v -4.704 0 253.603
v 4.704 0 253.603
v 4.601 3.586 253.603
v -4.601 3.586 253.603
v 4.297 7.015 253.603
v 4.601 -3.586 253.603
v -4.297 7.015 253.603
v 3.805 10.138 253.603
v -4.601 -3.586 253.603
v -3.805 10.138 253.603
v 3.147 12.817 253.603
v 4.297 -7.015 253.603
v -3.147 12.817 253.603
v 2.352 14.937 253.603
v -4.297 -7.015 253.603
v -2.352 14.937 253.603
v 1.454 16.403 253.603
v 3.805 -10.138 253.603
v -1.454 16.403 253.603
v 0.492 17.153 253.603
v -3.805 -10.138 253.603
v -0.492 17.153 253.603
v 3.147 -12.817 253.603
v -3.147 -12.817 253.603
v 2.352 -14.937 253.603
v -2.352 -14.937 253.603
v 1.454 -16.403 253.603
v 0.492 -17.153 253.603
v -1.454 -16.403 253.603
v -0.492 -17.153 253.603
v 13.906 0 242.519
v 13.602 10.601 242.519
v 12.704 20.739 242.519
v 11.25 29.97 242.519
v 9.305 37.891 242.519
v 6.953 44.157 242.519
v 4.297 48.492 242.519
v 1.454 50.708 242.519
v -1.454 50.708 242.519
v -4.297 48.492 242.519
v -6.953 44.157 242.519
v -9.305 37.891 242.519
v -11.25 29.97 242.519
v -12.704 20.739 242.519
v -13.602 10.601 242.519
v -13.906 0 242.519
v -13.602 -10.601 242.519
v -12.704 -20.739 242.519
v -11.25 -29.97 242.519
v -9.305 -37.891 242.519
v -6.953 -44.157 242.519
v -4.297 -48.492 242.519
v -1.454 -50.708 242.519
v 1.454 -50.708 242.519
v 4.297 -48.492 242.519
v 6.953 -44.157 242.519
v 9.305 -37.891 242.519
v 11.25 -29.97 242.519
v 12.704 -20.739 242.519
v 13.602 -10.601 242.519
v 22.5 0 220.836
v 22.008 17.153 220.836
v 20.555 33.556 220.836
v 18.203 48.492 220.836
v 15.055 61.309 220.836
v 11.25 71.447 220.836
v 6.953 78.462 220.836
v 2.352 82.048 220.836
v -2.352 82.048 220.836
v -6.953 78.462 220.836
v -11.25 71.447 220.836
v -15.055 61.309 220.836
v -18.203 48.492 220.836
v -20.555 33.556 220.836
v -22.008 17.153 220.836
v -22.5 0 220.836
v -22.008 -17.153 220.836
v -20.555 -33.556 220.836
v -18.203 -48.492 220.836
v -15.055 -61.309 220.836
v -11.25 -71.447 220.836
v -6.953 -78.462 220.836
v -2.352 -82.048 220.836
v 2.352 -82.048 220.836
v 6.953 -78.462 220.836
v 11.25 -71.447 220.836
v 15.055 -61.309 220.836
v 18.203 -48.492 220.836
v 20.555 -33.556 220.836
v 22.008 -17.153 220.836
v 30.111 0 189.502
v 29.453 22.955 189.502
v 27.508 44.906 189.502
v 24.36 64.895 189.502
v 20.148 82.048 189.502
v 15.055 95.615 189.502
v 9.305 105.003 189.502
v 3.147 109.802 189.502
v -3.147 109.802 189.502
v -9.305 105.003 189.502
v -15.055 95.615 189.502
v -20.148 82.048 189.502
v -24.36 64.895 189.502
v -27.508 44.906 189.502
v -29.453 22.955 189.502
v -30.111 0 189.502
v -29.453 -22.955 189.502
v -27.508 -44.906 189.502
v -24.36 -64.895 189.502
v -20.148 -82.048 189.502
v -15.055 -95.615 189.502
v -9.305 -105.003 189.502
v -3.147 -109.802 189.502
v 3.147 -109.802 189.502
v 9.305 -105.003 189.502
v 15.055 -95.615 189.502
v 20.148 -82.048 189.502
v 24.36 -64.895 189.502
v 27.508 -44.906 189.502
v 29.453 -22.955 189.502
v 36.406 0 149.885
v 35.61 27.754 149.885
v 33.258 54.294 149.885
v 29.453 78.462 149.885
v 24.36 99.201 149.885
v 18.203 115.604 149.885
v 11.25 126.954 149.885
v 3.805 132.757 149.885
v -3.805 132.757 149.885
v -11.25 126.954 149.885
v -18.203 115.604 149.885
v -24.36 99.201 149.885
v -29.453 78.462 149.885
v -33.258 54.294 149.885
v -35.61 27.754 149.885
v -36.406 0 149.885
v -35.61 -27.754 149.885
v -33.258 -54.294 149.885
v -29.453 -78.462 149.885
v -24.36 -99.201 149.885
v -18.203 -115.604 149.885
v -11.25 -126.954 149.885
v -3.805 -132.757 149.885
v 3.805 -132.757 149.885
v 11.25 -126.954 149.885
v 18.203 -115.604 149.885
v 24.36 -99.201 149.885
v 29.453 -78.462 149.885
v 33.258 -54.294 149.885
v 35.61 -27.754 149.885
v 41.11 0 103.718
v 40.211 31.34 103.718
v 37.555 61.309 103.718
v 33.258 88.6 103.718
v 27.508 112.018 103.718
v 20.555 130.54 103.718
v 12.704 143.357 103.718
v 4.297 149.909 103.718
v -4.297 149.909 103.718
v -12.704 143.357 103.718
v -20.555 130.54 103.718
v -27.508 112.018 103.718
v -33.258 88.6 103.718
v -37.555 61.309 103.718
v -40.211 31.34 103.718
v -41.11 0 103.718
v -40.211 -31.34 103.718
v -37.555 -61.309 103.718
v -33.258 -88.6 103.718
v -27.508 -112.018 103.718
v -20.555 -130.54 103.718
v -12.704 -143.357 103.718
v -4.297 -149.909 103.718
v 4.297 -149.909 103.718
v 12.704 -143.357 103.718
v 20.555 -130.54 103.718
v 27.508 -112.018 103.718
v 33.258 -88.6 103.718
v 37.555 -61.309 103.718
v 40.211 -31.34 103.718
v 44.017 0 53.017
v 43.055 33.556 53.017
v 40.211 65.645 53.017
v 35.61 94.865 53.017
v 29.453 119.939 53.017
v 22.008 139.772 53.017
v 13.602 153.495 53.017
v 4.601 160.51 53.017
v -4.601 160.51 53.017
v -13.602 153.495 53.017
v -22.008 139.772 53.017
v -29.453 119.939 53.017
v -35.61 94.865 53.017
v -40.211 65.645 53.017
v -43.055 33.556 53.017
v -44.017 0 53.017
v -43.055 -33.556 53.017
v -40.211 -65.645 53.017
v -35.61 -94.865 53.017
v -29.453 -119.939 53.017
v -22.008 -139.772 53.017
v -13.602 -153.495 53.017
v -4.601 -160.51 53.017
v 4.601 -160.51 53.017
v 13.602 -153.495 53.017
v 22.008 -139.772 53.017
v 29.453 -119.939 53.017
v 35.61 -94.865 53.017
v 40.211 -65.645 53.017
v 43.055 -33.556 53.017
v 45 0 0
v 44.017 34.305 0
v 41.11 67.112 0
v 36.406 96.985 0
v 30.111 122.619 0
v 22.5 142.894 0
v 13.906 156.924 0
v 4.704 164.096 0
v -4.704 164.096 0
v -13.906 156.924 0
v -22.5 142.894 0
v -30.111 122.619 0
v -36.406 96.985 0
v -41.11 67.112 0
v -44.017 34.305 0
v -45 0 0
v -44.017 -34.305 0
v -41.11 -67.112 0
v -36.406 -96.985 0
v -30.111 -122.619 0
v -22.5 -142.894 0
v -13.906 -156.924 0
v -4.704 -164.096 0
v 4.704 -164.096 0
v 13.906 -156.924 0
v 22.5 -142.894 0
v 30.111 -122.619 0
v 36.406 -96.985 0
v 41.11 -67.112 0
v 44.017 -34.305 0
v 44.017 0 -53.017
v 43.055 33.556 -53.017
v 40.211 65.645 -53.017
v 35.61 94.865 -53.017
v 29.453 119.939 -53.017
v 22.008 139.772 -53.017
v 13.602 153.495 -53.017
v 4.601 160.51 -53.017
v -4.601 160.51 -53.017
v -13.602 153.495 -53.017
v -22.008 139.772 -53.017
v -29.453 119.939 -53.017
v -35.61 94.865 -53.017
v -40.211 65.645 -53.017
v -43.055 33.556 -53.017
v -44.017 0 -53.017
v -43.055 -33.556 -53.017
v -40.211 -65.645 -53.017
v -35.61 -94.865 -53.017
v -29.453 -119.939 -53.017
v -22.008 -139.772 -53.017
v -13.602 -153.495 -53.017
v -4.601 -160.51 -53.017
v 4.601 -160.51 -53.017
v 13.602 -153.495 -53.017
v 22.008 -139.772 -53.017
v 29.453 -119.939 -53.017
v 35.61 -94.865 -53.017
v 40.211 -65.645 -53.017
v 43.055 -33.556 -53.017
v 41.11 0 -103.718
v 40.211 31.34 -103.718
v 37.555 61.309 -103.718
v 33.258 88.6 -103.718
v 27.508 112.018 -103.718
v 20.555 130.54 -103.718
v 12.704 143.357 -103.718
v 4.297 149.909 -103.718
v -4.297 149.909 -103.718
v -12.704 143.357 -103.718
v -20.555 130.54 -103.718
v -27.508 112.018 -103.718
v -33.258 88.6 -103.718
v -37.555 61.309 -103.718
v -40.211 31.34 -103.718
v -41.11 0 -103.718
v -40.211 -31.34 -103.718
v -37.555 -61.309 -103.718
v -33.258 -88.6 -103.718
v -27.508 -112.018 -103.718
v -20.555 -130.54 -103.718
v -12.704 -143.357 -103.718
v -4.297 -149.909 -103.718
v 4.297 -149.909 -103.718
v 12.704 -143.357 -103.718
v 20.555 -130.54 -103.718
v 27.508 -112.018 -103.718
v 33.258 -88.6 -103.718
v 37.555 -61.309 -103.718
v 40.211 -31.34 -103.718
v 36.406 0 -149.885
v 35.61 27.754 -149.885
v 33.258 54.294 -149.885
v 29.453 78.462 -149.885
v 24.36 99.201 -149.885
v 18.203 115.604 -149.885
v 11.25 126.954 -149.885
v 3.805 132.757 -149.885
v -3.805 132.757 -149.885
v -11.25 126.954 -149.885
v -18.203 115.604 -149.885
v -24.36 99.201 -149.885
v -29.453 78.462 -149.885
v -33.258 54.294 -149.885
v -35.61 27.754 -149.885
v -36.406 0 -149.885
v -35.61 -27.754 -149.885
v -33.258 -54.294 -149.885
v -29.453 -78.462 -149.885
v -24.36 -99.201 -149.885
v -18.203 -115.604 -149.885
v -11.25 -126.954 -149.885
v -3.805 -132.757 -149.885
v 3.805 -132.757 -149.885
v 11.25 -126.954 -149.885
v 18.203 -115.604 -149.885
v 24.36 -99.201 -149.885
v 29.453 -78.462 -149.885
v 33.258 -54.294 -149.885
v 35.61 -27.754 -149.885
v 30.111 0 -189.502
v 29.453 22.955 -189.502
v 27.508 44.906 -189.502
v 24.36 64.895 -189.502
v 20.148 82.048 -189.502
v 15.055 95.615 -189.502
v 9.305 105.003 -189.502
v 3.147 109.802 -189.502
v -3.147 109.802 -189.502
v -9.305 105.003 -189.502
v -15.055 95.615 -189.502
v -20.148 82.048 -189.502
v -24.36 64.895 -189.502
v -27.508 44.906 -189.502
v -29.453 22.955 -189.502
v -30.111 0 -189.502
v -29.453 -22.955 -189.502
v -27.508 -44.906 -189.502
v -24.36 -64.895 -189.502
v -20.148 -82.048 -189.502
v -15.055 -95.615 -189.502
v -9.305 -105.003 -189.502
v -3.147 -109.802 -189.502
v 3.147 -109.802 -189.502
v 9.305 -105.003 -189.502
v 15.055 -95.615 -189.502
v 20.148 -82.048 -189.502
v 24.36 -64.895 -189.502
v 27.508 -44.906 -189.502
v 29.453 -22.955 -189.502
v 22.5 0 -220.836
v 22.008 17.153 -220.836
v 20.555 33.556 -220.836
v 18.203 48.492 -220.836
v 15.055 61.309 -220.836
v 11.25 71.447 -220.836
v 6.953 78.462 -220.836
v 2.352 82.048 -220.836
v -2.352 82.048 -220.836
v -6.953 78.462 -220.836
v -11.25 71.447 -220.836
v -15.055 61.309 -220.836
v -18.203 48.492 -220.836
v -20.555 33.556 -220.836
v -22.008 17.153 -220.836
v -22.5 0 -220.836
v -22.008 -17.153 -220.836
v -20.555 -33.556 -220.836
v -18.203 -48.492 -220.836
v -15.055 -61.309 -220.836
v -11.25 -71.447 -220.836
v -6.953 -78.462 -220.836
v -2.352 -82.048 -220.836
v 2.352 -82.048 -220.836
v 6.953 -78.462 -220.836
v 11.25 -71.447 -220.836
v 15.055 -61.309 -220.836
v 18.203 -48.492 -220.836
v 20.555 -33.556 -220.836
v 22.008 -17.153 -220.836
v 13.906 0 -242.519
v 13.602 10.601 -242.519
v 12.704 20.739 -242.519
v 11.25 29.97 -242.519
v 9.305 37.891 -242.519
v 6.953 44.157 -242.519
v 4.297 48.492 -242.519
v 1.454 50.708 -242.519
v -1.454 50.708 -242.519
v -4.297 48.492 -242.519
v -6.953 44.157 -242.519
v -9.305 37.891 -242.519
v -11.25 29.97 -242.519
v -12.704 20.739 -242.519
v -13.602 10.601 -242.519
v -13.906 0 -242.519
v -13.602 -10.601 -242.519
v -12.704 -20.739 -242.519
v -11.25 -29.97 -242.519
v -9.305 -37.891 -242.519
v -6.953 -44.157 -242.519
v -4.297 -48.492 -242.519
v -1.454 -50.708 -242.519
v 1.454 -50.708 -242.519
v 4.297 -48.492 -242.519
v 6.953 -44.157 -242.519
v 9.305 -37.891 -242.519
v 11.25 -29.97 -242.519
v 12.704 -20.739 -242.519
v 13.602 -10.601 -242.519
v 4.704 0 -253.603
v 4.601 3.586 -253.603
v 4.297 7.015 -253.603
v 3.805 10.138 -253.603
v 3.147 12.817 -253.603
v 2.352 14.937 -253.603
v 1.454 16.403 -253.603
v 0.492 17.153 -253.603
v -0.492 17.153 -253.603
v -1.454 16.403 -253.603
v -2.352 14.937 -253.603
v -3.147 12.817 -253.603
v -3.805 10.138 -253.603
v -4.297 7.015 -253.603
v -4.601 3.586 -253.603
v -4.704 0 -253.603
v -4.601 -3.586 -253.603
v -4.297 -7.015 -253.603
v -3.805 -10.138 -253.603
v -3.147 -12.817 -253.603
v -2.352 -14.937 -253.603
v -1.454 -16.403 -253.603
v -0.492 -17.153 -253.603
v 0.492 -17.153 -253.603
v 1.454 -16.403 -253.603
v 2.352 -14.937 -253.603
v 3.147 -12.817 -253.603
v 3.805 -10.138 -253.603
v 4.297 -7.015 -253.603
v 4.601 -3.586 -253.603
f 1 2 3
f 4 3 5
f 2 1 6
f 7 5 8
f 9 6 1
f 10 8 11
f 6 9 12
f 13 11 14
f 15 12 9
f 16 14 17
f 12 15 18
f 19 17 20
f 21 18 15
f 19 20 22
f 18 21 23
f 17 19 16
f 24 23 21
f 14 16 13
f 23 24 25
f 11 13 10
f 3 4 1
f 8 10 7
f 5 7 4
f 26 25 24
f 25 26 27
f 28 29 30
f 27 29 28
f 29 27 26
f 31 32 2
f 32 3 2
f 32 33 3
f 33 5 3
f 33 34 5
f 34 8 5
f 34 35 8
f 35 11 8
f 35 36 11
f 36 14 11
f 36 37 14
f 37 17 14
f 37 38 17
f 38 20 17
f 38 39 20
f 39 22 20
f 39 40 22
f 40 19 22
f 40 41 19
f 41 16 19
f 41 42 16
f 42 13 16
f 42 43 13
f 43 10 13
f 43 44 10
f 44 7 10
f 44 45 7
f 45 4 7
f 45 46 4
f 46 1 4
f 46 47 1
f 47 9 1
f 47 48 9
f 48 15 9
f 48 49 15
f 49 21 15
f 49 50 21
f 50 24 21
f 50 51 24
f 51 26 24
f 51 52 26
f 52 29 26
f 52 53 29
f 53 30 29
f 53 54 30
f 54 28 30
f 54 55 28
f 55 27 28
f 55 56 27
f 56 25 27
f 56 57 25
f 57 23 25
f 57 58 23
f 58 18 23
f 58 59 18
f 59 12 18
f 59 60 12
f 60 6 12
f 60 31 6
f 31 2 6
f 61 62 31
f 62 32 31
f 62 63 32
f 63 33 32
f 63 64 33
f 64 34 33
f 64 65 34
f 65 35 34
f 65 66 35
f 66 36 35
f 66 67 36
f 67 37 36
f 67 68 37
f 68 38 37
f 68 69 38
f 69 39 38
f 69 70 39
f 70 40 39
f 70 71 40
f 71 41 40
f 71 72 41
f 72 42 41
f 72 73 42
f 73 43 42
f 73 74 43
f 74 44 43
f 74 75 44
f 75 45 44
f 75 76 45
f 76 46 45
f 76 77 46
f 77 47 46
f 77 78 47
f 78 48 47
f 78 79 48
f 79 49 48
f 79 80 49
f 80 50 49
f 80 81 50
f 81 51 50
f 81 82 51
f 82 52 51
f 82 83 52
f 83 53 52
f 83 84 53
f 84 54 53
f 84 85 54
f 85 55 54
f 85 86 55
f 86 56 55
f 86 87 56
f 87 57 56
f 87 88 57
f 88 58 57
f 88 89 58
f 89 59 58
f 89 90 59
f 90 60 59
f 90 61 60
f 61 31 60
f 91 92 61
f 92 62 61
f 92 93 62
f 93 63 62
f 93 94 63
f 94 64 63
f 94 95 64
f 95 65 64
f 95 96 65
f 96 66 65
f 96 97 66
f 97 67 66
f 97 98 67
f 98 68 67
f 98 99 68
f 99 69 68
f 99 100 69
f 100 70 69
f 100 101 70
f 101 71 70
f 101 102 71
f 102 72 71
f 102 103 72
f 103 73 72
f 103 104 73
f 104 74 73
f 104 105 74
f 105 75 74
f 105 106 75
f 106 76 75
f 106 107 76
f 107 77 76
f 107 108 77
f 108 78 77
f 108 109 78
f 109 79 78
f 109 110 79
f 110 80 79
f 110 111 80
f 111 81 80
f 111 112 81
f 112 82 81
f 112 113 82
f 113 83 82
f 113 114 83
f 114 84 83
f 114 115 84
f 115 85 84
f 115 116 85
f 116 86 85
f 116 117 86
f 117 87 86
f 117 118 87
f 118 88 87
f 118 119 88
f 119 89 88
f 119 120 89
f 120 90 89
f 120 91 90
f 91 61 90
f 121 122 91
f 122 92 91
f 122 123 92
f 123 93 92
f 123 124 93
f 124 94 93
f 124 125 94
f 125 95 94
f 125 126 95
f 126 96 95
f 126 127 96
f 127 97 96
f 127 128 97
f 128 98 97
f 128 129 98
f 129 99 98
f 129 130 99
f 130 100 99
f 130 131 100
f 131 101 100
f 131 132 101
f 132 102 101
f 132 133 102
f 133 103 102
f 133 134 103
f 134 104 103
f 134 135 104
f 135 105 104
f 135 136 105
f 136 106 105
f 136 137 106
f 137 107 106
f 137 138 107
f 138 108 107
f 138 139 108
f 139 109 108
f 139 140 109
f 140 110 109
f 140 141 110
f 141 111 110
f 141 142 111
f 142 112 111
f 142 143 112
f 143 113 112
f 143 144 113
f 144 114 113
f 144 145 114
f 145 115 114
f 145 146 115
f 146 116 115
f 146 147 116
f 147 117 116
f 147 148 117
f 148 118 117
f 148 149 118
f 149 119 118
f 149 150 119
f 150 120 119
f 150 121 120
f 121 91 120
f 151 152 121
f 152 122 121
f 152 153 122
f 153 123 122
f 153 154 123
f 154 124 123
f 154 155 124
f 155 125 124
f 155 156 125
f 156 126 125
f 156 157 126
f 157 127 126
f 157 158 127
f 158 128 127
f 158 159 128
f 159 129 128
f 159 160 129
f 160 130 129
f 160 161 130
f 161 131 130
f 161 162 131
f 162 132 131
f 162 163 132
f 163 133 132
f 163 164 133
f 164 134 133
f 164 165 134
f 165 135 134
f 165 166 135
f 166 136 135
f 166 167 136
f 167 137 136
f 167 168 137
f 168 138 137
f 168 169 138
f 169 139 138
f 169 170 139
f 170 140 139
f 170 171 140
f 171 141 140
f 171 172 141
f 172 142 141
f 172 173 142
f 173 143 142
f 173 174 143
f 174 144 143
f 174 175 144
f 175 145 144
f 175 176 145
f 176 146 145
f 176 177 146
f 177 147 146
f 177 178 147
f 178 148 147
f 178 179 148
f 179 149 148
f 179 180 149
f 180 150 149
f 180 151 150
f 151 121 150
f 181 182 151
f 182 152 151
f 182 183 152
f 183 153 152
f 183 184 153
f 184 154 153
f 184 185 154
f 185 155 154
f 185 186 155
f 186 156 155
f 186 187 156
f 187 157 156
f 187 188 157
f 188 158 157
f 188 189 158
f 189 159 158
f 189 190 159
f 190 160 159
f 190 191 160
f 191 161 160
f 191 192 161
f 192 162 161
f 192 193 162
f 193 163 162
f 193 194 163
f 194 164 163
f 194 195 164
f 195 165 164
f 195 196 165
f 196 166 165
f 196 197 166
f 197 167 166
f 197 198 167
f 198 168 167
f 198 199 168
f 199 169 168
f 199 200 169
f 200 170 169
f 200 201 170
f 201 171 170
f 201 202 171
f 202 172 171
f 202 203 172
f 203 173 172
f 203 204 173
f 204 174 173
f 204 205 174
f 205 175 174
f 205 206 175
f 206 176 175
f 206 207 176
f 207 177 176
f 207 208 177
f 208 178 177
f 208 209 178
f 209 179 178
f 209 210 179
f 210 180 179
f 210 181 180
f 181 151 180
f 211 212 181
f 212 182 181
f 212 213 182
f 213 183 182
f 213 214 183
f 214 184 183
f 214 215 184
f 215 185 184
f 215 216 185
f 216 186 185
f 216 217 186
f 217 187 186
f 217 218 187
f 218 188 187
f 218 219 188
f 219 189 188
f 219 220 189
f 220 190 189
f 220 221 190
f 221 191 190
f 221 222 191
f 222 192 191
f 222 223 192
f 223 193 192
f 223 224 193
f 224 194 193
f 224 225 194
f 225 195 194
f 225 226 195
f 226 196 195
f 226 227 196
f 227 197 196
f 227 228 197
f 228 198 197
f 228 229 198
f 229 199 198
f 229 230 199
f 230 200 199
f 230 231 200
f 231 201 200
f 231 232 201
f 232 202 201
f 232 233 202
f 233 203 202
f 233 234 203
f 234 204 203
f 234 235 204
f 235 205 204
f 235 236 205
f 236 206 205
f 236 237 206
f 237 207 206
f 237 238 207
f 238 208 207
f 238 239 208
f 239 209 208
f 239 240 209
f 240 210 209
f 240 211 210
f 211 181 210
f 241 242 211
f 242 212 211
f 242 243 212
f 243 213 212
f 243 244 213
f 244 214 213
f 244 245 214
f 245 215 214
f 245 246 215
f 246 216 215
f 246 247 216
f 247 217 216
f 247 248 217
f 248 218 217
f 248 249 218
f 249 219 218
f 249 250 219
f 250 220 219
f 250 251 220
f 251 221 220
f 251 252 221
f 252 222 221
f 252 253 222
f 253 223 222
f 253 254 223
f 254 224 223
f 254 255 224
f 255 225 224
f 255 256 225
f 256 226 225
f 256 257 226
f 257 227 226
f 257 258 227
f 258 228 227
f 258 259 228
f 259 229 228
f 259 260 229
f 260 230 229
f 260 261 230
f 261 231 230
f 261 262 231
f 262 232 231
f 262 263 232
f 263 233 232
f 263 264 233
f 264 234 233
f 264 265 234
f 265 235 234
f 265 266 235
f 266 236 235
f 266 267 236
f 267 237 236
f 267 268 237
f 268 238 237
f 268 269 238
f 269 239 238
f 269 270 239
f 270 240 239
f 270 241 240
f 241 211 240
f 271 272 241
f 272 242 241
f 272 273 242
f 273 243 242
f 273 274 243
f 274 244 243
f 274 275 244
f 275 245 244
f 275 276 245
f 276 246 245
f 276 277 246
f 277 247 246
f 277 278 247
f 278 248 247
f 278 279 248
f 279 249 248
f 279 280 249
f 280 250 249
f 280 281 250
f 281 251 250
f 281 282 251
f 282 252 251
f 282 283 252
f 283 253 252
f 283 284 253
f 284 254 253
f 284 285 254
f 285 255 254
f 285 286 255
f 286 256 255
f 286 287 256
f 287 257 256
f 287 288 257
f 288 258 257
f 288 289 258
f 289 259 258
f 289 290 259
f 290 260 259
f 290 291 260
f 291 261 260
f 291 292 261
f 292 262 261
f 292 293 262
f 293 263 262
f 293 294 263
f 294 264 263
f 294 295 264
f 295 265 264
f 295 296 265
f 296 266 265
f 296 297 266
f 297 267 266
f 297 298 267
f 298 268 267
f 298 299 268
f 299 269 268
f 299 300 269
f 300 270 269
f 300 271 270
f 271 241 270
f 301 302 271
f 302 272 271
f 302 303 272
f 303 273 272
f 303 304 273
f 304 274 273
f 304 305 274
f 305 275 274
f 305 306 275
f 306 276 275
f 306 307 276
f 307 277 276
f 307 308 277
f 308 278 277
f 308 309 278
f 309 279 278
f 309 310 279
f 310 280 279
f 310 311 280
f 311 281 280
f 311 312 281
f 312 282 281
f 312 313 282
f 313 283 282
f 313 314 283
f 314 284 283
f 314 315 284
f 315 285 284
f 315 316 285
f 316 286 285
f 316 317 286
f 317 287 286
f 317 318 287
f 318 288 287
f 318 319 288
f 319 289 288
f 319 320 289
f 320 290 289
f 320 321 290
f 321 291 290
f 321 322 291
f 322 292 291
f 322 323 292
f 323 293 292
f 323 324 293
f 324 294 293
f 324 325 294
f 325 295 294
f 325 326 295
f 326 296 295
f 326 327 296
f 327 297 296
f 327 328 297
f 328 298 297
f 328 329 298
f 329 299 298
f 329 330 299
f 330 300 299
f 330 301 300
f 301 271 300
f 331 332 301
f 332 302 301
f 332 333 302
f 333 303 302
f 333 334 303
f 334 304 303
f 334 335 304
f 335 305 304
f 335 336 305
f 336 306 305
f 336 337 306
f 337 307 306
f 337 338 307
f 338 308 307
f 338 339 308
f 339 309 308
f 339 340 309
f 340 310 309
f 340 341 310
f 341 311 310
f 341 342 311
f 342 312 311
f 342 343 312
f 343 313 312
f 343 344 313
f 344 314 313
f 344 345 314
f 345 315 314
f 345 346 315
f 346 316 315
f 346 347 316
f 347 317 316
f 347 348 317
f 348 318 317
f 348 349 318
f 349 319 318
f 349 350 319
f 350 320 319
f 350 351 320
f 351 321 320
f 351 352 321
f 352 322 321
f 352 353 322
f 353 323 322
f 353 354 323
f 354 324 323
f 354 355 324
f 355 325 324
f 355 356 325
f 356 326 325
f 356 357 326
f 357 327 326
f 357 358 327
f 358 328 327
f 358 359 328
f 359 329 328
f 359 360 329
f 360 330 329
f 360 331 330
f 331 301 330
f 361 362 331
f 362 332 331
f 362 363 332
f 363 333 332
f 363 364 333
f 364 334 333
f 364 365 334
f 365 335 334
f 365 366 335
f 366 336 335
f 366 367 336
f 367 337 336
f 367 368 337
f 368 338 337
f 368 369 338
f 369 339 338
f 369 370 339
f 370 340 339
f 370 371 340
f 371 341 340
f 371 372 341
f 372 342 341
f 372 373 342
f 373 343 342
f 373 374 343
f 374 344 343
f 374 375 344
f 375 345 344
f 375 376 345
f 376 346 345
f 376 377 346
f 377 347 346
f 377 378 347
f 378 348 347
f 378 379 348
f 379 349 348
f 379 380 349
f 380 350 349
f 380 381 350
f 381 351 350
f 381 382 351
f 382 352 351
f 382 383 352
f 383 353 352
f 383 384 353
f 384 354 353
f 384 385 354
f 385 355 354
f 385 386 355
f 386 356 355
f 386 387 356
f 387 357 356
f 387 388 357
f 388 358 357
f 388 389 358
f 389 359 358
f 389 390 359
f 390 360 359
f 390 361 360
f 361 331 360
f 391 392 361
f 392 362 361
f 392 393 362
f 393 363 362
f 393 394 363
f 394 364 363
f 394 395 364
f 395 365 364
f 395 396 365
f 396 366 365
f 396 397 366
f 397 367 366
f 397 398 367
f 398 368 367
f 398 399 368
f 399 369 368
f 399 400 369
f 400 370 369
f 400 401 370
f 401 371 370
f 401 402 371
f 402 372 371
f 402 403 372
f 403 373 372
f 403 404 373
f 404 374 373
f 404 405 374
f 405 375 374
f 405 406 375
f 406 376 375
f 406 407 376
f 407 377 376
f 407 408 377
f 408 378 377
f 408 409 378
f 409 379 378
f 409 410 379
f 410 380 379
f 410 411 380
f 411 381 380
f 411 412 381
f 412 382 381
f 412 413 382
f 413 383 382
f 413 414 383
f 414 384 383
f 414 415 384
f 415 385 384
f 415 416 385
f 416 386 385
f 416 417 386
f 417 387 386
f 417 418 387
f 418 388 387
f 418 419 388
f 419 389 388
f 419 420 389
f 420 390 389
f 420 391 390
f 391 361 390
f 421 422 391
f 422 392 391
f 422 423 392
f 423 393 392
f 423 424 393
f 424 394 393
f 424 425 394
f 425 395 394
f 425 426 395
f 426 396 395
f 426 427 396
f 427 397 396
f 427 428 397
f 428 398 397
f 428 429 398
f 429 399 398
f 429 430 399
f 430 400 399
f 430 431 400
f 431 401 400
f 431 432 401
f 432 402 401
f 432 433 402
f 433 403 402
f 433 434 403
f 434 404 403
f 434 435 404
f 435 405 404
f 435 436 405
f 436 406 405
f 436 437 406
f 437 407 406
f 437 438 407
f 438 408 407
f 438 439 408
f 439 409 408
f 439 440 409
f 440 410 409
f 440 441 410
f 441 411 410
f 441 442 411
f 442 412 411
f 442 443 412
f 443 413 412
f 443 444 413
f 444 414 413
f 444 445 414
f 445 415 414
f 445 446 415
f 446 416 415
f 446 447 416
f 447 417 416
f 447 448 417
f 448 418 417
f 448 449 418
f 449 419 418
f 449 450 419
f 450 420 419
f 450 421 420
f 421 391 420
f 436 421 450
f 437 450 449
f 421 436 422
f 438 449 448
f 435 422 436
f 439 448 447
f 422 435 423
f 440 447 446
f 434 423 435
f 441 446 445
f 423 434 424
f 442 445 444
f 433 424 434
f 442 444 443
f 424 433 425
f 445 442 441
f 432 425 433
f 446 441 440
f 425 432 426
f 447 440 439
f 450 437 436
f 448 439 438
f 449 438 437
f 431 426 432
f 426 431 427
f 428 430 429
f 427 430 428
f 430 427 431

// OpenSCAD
// Generated by SolidPython 1.0.1 on 2020-07-29 00:46:45


scale(v = [3, 11, 17]) {
	sphere(r = 15);
}
/***********************************************
*********      SolidPython code:      **********
************************************************
 
# import packages: SolidPython
from solid import *
from solid.utils import *
from itertools import chain, combinations, permutations


class Resize:

    def __init__(self, scad_file):
        self.scad_file = scad_file
        #self.scad_file = import_scad(scad_file)
        # cone/cylinder param:
        self.r1 = 0
        self.r2 = 0
        self.h = 0
        # rectangular prism param:
        self.w = 0
        self.l = 0
        # ellipse param:
        self.r = 0

    # import OpenScad code (file name corresponds to shape)


    # classify shape + parameters
    def assign(self, param1, param2, param3):
        if self.scad_file == 'cone.scad':
            self.r1 = param1
            self.r2 = param2
            self.h = param3
        elif self.scad_file == 'cylinder.scad':
            self.r1 = param1
            self.r2 = param2
            self.h = param3
        elif self.scad_file == 'rectangularPrism.scad':
            self.h = param1
            self.l = param2
            self.w = param3
        else:
            self.r = param1
            self.h = param2

    # resize parameters
    def iterate(self):
        x = range(3, 20, 2)
        i = 1
        if self.scad_file == 'cone.scad':
            tempList = list(permutations(x, 2))
            for temp in tempList:
                param1 = temp[0]
                param2 = temp[1]
                filepath = 'produced_scad_files/' + 'cone' + str(param1) + '_' + str(param2) + '_' + '.scad'
                scad_render_to_file(cylinder(h=param1, r1=param2, r2=0), filepath)

        elif self.scad_file == 'cylinder.scad':
            tempList = list(permutations(x, 3))
            for temp in tempList:
                param1 = temp[0]
                param2 = temp[1]
                filepath = 'produced_scad_files/' + 'cylinder' + str(param1) + '_' + str(param2) + '_' + '.scad'
                scad_render_to_file(cylinder(h=param1, r1=param2, r2=param2), filepath)

        elif self.scad_file == 'rectangularPrism.scad':
            tempList = list(permutations(x, 3))
            for temp in tempList:
                param1 = temp[0]
                param2 = temp[1]
                param3 = temp[2]
                filepath = 'produced_scad_files/' + 'rectangularPrism' + str(param1) + '_' + str(param2) + '_' + str(
                    param3) + '.scad'
                scad_render_to_file(cube(size=(param1, param2, param3)), filepath)

        elif self.scad_file == 'ellipse.scad':
            tempList = list(permutations(x, 4))
            for temp in tempList:
                param1 = temp[0]
                param2 = temp[1]
                param3 = temp[2]
                param4 = temp[3]
                filepath = 'produced_scad_files/' + 'ellipse' + str(param1) + '_' + str(param2) + '_' + str(param3) + '_' + str(param4) + '.scad'
                scad_render_to_file(scale([param1, param2, param3])(sphere(r=param4)), filepath)

    def render_to_scadfile(self):
        scad_render_to_file(scad, 'example.scad') 
 
************************************************/
